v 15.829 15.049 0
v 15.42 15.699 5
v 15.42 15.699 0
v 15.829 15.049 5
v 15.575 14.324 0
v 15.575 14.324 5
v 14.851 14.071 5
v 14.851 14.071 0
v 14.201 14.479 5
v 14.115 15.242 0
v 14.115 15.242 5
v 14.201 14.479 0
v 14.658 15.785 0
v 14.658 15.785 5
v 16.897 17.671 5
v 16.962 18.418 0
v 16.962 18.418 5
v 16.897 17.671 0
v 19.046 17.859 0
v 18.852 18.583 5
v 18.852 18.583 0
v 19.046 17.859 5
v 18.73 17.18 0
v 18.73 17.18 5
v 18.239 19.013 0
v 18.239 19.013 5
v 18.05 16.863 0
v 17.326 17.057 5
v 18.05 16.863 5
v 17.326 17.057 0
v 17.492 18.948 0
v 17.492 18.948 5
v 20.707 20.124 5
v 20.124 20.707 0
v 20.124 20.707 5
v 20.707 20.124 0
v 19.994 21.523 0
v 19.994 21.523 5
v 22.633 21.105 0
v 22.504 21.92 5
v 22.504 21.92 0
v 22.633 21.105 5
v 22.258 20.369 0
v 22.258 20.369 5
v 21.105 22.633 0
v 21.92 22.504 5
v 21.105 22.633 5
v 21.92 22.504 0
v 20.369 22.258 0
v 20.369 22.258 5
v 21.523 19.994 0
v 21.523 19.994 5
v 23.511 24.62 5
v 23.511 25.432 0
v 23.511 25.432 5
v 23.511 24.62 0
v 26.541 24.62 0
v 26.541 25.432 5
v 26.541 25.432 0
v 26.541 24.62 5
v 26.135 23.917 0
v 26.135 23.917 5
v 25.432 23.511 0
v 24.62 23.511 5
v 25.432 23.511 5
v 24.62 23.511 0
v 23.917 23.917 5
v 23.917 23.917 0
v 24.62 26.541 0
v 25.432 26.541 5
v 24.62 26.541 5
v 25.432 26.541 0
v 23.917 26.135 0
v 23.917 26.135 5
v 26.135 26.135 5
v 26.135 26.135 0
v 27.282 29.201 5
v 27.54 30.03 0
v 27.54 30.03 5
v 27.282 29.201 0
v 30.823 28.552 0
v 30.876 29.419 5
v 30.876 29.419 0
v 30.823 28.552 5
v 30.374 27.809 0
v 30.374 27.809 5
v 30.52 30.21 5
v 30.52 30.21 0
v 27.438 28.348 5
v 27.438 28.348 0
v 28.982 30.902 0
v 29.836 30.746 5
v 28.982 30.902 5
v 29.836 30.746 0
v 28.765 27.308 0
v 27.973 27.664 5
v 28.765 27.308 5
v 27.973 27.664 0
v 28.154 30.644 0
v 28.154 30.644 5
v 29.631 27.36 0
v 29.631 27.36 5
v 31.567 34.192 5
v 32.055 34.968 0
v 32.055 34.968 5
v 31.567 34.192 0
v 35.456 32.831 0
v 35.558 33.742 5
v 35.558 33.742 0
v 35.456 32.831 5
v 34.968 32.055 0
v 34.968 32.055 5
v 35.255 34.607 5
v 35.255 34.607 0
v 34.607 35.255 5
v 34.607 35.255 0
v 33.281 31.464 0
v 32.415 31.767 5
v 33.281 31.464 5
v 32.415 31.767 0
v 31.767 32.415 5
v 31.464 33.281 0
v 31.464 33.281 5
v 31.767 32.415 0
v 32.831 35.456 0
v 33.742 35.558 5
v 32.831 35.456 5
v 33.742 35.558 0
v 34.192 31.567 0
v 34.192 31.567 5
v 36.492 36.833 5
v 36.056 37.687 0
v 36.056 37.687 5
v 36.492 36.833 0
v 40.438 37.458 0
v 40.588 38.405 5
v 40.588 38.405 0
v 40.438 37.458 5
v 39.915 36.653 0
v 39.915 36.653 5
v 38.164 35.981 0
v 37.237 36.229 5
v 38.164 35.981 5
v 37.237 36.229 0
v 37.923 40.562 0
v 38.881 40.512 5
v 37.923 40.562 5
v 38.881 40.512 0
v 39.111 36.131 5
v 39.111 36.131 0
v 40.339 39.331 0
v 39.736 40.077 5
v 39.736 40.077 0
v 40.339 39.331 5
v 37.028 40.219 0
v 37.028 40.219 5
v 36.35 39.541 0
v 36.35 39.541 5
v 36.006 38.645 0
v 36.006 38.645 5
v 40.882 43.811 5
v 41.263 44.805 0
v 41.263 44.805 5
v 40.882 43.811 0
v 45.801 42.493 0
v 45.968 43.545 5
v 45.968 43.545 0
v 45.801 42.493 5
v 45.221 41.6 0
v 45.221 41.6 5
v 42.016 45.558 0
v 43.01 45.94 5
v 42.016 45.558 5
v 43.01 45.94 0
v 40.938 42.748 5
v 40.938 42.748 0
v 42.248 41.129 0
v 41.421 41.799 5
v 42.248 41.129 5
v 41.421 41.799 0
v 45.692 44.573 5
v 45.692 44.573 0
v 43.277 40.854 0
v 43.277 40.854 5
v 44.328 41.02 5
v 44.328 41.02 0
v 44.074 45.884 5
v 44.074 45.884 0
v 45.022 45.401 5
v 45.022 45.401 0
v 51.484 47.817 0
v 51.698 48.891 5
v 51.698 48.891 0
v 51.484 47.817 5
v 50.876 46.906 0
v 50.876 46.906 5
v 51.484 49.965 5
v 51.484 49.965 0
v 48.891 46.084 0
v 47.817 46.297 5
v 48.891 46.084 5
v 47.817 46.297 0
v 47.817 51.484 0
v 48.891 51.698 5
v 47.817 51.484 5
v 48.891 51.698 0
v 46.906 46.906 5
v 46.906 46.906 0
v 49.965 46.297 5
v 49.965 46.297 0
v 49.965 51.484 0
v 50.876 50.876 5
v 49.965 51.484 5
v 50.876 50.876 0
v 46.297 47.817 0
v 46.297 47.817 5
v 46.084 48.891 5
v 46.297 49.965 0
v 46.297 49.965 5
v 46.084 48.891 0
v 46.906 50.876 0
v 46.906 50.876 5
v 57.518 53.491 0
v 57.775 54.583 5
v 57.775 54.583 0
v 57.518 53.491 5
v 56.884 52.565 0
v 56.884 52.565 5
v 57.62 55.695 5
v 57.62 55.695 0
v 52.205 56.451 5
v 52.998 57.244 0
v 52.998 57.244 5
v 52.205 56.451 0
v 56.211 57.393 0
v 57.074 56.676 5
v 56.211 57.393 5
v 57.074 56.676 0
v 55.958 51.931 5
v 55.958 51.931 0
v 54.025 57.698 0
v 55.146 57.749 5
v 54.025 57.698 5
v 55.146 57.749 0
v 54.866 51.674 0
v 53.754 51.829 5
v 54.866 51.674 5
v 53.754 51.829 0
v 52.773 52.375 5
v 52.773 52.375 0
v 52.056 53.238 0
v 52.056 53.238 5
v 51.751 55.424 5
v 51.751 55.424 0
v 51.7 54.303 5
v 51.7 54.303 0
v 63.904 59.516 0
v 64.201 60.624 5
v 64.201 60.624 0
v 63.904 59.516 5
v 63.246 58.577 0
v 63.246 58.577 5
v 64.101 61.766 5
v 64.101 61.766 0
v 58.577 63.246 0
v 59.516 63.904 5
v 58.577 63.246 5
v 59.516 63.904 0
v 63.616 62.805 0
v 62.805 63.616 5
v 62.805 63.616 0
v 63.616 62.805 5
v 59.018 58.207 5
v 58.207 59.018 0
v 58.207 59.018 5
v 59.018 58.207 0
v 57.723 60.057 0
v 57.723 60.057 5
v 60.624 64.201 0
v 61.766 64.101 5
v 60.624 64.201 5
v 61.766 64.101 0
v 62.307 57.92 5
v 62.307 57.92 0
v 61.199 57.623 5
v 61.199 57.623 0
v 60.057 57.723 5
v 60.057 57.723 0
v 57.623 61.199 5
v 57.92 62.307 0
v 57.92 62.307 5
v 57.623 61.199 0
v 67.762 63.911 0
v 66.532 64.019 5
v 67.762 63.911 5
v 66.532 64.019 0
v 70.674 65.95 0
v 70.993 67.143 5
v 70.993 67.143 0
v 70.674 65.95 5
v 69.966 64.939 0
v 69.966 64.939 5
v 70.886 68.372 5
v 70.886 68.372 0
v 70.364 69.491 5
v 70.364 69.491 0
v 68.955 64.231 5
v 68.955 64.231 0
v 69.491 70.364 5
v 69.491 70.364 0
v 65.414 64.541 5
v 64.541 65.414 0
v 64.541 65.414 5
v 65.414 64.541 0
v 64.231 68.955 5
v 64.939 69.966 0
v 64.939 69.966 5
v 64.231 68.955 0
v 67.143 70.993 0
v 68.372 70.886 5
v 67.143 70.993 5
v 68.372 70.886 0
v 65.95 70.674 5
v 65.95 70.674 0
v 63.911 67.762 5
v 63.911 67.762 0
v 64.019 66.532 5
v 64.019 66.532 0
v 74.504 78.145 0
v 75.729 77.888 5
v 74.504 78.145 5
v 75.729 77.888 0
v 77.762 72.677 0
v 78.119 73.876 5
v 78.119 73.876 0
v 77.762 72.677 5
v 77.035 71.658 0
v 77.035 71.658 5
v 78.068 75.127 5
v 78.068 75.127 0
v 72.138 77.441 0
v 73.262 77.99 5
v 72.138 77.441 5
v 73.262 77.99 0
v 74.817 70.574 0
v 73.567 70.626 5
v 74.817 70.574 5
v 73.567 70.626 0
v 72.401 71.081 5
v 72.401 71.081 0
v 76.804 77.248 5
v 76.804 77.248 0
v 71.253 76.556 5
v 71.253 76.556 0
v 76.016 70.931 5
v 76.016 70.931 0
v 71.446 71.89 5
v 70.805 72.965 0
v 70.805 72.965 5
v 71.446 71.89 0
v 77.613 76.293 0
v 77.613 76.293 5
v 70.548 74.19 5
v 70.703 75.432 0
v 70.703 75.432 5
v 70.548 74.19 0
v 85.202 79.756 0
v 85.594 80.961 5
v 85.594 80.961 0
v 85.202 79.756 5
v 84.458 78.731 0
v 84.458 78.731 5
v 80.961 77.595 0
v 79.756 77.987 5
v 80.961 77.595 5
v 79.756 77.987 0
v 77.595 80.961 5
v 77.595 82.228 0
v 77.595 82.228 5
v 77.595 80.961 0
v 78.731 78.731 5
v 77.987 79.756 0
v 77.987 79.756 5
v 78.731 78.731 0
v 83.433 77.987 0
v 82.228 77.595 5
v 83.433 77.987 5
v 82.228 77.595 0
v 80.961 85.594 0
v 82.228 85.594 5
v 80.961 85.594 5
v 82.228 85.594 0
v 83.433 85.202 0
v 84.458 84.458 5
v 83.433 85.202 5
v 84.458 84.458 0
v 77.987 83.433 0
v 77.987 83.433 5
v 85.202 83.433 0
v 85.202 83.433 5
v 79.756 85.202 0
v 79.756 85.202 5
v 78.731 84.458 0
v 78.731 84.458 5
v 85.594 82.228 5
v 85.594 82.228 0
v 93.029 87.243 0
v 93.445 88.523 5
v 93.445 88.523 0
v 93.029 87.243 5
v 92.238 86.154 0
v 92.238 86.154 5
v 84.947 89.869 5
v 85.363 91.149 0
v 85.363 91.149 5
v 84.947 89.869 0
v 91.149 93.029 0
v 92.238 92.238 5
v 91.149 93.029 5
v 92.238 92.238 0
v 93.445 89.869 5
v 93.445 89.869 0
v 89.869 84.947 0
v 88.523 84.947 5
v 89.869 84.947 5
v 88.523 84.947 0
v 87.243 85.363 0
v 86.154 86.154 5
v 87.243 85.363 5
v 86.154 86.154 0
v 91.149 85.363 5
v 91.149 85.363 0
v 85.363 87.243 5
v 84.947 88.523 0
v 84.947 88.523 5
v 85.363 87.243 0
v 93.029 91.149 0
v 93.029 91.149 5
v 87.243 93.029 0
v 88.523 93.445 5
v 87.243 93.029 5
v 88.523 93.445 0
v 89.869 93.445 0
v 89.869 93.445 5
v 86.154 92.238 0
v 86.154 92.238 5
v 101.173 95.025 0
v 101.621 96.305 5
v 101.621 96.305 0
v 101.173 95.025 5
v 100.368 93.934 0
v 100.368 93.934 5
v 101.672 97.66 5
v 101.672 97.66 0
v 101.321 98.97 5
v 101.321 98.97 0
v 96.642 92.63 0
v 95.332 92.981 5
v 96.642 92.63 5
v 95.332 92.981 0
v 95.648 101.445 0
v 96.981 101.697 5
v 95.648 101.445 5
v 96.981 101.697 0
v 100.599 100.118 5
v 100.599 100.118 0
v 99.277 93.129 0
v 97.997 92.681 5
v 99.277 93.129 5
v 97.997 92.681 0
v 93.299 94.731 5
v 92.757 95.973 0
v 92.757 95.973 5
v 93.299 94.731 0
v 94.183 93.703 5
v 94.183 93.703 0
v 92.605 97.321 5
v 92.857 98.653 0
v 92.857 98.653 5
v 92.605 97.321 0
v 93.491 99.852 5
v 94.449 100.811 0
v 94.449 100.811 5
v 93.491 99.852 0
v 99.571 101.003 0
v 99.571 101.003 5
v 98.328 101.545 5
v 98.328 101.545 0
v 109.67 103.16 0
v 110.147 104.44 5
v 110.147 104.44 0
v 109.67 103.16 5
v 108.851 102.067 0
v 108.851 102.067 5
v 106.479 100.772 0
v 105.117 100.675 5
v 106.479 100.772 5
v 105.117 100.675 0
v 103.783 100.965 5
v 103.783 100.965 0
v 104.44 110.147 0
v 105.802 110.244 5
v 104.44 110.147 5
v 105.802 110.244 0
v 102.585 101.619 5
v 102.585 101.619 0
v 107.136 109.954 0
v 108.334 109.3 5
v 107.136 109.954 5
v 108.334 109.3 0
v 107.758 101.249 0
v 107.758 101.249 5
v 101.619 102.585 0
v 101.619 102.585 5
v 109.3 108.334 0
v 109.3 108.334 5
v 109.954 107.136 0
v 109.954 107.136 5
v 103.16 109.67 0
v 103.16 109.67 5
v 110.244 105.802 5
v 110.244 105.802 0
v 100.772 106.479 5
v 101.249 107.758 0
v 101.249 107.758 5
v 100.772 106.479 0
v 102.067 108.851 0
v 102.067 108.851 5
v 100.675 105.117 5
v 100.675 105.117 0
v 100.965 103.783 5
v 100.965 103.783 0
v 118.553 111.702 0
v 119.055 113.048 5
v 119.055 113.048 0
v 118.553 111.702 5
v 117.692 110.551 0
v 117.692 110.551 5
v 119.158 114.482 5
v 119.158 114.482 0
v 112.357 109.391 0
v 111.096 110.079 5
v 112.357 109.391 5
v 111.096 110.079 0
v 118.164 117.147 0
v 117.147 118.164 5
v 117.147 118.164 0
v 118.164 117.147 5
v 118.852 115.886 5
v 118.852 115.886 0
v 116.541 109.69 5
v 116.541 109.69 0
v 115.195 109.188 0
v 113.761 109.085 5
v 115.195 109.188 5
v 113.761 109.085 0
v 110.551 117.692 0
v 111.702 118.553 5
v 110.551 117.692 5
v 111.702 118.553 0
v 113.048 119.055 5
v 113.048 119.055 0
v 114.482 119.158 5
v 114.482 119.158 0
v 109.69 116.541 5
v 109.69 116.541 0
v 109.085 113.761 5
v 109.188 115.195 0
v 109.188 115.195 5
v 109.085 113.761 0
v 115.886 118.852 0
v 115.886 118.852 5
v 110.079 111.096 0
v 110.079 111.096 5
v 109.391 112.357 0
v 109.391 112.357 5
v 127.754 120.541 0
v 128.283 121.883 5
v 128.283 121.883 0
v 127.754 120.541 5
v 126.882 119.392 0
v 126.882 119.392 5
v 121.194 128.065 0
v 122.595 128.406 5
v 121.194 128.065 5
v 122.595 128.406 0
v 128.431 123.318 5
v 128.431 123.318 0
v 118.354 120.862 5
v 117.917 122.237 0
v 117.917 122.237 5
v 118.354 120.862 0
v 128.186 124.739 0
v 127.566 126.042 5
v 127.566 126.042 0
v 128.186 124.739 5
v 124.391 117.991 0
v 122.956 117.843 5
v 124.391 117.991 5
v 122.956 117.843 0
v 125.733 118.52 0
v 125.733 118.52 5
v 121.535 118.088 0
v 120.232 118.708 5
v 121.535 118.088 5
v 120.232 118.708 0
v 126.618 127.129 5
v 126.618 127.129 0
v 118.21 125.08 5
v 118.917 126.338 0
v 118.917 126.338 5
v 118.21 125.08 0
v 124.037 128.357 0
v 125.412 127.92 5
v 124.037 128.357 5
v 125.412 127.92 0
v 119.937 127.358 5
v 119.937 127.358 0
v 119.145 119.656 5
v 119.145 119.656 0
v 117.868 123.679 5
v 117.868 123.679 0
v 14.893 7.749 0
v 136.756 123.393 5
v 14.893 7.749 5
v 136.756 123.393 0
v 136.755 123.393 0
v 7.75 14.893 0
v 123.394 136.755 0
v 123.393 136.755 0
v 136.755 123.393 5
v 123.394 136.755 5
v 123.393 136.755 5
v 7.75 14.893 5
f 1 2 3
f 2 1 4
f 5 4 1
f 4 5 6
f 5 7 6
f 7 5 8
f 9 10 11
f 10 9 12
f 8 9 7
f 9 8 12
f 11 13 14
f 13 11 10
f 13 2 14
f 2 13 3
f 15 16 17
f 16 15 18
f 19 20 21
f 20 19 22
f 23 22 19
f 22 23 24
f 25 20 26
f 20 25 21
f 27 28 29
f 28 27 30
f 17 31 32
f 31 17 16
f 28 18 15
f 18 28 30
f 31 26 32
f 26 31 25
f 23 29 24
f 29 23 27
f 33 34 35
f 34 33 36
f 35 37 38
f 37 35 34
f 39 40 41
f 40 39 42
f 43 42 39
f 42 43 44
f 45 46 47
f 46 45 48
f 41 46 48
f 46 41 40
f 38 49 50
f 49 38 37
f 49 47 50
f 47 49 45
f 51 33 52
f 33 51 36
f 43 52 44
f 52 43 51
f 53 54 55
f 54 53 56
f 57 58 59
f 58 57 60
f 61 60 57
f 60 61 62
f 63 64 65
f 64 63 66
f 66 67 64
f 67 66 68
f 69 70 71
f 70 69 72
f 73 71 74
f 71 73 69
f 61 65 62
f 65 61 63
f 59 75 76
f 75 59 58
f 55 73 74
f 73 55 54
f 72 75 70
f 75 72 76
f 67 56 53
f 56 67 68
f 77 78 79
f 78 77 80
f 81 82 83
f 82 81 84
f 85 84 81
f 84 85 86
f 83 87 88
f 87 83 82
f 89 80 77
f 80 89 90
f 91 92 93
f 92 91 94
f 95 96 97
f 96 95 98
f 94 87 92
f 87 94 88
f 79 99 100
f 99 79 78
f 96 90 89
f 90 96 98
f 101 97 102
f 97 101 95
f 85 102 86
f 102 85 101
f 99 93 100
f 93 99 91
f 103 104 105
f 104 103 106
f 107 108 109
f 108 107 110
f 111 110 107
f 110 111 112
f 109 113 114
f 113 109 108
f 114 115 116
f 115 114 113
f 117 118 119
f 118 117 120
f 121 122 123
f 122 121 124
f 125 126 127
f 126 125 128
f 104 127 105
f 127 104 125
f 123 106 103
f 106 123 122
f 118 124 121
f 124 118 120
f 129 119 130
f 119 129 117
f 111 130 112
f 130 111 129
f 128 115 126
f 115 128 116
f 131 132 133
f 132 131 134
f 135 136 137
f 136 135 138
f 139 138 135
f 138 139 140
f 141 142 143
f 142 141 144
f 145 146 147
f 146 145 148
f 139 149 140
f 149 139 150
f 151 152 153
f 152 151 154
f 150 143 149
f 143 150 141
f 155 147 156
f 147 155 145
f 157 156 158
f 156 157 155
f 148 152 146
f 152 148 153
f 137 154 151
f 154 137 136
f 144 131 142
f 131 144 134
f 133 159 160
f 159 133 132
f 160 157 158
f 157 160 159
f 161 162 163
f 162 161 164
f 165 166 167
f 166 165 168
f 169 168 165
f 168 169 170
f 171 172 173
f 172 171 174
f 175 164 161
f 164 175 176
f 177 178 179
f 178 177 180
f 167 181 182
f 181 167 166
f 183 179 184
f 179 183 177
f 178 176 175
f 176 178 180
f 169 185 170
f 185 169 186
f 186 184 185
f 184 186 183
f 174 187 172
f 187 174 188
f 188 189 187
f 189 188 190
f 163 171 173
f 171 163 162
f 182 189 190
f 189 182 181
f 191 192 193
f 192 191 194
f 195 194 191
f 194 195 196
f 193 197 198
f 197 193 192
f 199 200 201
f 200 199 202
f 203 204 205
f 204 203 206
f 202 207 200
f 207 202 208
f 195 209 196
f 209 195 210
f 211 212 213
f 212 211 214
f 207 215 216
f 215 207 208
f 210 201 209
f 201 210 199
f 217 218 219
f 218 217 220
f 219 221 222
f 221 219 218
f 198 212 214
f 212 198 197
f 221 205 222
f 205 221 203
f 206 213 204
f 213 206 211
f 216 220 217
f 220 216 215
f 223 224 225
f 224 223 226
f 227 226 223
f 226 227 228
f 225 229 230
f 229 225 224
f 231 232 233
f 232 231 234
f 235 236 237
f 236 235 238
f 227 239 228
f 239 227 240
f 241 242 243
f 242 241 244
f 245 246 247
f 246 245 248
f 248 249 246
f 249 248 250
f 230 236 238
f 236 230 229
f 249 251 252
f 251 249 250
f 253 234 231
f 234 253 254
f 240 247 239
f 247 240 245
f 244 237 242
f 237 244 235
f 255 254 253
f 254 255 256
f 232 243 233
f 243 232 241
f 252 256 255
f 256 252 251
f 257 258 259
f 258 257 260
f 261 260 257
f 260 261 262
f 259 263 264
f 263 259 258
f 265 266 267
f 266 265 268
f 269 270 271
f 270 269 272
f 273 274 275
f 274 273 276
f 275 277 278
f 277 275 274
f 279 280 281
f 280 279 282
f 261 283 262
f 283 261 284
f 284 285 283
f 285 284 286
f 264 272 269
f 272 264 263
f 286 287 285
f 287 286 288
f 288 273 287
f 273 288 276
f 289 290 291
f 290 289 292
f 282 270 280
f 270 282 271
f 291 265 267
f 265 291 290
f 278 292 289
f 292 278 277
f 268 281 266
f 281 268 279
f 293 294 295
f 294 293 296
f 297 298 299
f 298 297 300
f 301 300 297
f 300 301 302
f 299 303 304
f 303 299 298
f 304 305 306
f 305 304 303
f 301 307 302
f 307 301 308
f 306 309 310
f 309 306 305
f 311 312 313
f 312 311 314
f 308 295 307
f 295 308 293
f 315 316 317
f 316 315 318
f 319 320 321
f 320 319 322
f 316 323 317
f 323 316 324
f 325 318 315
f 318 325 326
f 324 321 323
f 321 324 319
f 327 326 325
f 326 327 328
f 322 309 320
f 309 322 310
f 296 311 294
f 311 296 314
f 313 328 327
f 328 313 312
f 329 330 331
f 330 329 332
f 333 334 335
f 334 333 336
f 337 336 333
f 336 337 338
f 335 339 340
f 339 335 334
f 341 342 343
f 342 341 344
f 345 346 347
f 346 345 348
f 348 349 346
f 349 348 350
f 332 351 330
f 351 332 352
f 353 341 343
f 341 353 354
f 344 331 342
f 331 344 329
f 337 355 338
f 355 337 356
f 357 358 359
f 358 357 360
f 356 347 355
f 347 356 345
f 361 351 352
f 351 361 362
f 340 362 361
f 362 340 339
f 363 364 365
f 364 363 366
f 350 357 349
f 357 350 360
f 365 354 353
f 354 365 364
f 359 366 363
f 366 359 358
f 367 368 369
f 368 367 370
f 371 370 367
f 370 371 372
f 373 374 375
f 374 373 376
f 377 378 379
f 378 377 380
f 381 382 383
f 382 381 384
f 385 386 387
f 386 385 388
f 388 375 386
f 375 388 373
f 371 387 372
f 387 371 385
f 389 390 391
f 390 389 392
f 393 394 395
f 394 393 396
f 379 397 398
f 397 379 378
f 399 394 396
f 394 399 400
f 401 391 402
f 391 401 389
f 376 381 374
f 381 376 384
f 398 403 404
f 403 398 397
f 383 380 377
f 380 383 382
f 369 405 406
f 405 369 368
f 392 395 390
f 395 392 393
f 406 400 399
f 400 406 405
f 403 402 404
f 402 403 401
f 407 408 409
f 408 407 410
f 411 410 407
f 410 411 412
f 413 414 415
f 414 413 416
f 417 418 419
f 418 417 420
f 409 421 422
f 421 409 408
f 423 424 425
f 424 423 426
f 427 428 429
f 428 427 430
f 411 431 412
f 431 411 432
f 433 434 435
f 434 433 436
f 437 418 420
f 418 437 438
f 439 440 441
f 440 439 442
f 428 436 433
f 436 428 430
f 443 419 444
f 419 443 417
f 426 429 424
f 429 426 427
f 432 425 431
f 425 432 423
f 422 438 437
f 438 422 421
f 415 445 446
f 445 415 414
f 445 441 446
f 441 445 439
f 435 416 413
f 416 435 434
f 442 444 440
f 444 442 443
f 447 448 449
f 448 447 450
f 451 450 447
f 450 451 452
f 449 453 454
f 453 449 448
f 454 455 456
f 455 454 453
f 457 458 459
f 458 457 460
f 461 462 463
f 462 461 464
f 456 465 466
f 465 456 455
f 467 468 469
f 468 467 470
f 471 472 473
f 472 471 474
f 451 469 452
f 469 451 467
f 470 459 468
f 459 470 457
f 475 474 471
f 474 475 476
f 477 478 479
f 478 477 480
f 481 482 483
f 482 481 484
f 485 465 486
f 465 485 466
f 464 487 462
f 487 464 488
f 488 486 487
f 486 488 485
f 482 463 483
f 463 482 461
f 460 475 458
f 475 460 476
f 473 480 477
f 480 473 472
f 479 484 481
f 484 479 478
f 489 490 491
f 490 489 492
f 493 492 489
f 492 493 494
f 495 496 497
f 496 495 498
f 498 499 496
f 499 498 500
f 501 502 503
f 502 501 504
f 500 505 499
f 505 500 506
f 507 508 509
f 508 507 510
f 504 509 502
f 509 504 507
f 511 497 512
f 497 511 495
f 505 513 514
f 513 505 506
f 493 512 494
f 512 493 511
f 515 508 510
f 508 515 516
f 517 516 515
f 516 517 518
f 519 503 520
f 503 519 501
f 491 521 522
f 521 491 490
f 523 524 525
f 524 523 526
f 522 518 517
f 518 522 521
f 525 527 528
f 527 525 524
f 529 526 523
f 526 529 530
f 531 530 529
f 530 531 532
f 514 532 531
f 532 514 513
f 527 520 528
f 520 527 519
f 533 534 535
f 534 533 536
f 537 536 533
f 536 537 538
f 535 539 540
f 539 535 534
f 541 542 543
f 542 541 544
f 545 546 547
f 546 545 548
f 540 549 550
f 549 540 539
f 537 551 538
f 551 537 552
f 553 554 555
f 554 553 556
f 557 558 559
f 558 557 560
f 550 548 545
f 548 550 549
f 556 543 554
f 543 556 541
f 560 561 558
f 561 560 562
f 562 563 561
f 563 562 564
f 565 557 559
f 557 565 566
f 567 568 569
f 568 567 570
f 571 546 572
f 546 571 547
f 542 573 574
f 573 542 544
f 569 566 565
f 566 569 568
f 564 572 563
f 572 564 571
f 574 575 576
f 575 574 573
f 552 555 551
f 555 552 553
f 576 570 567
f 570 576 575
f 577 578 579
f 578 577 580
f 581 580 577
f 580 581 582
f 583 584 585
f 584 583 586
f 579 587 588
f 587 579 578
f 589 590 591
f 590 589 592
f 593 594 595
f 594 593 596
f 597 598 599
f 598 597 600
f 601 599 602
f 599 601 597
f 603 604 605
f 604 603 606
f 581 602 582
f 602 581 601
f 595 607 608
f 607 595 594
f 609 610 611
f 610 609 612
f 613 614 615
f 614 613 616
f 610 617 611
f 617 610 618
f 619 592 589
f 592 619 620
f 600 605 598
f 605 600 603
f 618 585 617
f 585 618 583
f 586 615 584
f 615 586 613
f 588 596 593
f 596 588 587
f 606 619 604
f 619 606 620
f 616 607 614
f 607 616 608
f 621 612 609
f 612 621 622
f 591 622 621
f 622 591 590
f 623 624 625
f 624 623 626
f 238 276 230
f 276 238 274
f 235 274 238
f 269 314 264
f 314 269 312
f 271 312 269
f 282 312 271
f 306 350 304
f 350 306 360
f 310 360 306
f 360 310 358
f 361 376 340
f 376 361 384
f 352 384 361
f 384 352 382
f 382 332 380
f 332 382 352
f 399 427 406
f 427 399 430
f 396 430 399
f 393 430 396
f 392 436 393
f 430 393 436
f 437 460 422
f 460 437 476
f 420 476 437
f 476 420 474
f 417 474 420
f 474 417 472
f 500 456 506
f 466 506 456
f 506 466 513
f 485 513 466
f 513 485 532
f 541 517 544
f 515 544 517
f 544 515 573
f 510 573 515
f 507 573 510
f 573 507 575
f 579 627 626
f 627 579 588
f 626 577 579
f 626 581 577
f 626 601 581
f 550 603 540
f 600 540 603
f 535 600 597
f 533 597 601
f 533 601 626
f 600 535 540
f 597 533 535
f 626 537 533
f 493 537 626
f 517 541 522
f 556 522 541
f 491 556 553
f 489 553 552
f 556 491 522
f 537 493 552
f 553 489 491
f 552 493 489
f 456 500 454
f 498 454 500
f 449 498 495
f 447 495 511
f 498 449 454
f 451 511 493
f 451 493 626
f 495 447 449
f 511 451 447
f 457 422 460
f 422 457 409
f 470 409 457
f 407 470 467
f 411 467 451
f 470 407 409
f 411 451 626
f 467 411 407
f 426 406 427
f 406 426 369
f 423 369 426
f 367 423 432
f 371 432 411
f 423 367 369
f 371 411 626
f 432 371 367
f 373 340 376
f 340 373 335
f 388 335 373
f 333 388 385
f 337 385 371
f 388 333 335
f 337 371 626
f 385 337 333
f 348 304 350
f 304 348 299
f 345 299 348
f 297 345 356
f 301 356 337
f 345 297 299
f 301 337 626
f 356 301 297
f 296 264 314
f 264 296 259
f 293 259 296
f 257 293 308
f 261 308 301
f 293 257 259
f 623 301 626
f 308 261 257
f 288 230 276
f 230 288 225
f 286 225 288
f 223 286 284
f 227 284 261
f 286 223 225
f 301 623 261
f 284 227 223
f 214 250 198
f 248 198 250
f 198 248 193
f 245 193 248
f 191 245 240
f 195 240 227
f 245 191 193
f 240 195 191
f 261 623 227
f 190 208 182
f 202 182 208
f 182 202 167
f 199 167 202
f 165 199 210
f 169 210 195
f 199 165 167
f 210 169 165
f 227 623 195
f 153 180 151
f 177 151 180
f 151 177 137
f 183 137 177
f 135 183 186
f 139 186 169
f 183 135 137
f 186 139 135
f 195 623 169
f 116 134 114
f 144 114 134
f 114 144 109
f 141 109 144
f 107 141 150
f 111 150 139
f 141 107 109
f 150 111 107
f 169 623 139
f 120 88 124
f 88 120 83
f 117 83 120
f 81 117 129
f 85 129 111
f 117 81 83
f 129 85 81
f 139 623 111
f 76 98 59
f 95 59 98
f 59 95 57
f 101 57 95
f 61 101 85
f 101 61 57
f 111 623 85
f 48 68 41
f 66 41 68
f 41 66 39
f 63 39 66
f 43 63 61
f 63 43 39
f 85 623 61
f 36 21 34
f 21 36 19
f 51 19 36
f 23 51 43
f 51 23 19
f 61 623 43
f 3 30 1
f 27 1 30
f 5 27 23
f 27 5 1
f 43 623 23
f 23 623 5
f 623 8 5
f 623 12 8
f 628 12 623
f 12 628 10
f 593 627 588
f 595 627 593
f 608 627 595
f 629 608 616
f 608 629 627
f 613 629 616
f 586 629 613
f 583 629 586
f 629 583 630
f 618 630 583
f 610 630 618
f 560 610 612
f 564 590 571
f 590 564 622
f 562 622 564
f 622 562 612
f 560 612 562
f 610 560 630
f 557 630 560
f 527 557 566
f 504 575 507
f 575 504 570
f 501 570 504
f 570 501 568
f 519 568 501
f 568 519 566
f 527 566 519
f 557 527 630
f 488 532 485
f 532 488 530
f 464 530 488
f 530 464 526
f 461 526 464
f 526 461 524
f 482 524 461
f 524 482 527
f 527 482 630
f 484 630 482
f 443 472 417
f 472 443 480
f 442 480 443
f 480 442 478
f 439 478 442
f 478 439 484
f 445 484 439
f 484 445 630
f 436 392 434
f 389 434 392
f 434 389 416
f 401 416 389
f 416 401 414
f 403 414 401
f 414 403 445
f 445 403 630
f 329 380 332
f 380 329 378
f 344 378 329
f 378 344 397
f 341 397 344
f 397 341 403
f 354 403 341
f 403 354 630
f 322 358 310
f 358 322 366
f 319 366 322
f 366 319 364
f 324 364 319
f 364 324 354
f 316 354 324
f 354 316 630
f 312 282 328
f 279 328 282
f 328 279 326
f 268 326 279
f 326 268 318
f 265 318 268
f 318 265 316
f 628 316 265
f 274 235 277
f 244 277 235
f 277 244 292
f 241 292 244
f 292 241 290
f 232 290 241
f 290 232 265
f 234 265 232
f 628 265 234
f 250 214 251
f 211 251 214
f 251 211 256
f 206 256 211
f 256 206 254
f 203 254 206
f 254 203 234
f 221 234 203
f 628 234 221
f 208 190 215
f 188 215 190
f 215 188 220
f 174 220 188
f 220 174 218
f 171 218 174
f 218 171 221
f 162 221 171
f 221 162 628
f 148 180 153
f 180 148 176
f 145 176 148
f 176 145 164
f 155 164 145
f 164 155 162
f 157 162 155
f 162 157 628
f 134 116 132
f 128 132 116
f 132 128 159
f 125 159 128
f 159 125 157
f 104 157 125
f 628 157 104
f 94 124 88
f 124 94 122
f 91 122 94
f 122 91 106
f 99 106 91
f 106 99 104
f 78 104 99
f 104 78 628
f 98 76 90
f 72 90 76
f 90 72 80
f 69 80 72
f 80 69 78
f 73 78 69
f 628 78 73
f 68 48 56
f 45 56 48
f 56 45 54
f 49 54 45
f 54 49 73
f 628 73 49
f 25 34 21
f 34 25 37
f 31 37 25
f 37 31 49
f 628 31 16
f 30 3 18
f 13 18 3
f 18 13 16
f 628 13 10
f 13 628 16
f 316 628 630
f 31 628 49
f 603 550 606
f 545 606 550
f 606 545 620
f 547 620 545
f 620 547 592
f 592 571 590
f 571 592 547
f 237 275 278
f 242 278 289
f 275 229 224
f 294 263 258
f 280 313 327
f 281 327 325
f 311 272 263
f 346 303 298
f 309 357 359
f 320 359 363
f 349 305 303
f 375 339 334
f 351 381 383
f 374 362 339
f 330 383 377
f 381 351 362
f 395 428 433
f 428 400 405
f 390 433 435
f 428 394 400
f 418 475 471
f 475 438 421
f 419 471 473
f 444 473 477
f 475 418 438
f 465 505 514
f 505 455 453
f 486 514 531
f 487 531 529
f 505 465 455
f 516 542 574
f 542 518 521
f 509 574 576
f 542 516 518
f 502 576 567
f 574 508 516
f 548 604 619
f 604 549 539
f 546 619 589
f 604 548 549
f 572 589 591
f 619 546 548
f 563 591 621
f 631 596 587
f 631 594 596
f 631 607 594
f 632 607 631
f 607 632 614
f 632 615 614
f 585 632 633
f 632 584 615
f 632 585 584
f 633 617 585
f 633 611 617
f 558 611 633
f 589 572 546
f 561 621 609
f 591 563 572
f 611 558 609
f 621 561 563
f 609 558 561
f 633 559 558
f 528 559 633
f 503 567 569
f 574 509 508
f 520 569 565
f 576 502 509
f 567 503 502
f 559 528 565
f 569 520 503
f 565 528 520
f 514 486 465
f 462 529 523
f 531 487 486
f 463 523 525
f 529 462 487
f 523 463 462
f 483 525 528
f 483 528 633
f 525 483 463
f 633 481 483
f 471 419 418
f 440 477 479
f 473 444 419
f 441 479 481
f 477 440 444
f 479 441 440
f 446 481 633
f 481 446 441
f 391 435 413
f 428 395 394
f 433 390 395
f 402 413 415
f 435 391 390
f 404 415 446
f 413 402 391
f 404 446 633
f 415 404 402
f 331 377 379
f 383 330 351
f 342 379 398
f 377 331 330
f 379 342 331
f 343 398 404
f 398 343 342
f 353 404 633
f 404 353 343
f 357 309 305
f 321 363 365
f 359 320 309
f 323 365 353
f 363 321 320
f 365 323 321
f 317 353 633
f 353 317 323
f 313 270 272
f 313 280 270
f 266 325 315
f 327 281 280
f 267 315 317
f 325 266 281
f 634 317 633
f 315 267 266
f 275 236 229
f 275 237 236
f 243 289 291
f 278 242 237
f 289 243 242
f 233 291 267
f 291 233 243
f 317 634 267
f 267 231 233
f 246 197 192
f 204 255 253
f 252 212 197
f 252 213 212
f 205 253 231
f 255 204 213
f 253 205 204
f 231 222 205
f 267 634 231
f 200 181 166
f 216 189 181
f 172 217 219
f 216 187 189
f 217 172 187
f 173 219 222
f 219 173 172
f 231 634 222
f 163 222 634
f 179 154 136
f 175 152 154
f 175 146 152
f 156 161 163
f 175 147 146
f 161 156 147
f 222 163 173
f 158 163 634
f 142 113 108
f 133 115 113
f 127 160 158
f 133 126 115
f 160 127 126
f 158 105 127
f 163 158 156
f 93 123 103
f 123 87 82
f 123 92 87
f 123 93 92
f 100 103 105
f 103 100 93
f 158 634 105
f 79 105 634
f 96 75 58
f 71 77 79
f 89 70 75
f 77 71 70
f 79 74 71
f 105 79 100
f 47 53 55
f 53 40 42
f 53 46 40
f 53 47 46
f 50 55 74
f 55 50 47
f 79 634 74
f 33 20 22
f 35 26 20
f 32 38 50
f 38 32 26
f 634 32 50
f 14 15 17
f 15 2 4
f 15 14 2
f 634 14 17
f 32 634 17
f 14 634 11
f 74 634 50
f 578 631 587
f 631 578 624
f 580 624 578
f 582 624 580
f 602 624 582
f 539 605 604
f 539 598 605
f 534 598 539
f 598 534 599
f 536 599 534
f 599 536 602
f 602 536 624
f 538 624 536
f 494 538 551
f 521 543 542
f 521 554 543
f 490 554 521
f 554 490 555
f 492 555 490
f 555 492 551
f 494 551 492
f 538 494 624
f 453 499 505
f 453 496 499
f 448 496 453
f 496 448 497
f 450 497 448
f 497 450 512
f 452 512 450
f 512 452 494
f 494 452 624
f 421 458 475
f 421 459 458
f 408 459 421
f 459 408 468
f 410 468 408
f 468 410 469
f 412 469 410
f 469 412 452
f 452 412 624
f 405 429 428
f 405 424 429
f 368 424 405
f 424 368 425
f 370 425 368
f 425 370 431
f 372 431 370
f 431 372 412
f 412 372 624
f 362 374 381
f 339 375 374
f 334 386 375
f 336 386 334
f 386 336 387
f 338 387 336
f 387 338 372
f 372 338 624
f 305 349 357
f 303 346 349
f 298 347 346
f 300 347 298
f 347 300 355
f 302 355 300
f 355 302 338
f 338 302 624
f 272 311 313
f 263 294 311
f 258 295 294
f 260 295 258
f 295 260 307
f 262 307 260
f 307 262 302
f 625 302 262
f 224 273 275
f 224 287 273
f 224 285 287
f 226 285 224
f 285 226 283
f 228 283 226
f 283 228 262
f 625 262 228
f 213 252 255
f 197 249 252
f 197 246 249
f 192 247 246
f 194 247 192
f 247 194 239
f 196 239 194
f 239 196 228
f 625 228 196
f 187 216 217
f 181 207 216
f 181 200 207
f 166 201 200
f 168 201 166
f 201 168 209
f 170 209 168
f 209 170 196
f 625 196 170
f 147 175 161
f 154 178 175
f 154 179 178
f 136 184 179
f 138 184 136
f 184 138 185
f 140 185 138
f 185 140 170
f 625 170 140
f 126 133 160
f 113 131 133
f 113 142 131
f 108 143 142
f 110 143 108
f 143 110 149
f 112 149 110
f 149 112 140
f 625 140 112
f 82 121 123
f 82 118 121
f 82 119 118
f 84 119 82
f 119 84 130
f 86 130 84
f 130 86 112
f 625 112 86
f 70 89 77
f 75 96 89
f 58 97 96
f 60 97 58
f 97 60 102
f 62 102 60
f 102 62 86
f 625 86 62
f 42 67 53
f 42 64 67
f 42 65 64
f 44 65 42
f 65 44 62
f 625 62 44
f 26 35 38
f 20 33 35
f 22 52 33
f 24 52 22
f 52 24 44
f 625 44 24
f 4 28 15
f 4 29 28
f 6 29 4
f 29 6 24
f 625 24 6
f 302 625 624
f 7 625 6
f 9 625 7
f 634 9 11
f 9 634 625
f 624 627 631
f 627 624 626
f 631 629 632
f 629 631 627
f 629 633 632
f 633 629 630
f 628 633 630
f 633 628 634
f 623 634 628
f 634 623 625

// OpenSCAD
nozzle_dia=0.4;
layer_height=0.3;

function pi() = 3.141592;
function width(d,h) = h-(pi()*((h*h)-(d*d)))/(4*h);
function arc(r,t) = 0.5*(t+sqrt((t*t)+4*(r*r)));
function polyhole(r,n,t) = arc(r,t)/cos(180/n);

function sides(d,t) = ceil(180 / acos((d-t)/d));

module hole(d,h)
{
  n=sides(d,0.1);
  t=width(nozzle_dia,layer_height);
  pr=polyhole(d/2,n,t);
  echo(d,n,pr*2);
  translate([0,0,-1])cylinder(r=pr,h=h+2,$fn=n);    
}

module main() {
  difference() {
    linear_extrude(5) {
      hull(){
        rotate([0,0,-46.5])
          translate([5,2])
            square([0.001,168]);

        rotate([0,0,-43.5])
          translate([-5,2])
            square([0.001,168]);
      }
    }
    rotate([0,0,-45])
      for(i=[1:0.5:10])
	    translate([0,i*(i+6),0])hole(i,5);
  }
}

translate([10,10,0])main();
